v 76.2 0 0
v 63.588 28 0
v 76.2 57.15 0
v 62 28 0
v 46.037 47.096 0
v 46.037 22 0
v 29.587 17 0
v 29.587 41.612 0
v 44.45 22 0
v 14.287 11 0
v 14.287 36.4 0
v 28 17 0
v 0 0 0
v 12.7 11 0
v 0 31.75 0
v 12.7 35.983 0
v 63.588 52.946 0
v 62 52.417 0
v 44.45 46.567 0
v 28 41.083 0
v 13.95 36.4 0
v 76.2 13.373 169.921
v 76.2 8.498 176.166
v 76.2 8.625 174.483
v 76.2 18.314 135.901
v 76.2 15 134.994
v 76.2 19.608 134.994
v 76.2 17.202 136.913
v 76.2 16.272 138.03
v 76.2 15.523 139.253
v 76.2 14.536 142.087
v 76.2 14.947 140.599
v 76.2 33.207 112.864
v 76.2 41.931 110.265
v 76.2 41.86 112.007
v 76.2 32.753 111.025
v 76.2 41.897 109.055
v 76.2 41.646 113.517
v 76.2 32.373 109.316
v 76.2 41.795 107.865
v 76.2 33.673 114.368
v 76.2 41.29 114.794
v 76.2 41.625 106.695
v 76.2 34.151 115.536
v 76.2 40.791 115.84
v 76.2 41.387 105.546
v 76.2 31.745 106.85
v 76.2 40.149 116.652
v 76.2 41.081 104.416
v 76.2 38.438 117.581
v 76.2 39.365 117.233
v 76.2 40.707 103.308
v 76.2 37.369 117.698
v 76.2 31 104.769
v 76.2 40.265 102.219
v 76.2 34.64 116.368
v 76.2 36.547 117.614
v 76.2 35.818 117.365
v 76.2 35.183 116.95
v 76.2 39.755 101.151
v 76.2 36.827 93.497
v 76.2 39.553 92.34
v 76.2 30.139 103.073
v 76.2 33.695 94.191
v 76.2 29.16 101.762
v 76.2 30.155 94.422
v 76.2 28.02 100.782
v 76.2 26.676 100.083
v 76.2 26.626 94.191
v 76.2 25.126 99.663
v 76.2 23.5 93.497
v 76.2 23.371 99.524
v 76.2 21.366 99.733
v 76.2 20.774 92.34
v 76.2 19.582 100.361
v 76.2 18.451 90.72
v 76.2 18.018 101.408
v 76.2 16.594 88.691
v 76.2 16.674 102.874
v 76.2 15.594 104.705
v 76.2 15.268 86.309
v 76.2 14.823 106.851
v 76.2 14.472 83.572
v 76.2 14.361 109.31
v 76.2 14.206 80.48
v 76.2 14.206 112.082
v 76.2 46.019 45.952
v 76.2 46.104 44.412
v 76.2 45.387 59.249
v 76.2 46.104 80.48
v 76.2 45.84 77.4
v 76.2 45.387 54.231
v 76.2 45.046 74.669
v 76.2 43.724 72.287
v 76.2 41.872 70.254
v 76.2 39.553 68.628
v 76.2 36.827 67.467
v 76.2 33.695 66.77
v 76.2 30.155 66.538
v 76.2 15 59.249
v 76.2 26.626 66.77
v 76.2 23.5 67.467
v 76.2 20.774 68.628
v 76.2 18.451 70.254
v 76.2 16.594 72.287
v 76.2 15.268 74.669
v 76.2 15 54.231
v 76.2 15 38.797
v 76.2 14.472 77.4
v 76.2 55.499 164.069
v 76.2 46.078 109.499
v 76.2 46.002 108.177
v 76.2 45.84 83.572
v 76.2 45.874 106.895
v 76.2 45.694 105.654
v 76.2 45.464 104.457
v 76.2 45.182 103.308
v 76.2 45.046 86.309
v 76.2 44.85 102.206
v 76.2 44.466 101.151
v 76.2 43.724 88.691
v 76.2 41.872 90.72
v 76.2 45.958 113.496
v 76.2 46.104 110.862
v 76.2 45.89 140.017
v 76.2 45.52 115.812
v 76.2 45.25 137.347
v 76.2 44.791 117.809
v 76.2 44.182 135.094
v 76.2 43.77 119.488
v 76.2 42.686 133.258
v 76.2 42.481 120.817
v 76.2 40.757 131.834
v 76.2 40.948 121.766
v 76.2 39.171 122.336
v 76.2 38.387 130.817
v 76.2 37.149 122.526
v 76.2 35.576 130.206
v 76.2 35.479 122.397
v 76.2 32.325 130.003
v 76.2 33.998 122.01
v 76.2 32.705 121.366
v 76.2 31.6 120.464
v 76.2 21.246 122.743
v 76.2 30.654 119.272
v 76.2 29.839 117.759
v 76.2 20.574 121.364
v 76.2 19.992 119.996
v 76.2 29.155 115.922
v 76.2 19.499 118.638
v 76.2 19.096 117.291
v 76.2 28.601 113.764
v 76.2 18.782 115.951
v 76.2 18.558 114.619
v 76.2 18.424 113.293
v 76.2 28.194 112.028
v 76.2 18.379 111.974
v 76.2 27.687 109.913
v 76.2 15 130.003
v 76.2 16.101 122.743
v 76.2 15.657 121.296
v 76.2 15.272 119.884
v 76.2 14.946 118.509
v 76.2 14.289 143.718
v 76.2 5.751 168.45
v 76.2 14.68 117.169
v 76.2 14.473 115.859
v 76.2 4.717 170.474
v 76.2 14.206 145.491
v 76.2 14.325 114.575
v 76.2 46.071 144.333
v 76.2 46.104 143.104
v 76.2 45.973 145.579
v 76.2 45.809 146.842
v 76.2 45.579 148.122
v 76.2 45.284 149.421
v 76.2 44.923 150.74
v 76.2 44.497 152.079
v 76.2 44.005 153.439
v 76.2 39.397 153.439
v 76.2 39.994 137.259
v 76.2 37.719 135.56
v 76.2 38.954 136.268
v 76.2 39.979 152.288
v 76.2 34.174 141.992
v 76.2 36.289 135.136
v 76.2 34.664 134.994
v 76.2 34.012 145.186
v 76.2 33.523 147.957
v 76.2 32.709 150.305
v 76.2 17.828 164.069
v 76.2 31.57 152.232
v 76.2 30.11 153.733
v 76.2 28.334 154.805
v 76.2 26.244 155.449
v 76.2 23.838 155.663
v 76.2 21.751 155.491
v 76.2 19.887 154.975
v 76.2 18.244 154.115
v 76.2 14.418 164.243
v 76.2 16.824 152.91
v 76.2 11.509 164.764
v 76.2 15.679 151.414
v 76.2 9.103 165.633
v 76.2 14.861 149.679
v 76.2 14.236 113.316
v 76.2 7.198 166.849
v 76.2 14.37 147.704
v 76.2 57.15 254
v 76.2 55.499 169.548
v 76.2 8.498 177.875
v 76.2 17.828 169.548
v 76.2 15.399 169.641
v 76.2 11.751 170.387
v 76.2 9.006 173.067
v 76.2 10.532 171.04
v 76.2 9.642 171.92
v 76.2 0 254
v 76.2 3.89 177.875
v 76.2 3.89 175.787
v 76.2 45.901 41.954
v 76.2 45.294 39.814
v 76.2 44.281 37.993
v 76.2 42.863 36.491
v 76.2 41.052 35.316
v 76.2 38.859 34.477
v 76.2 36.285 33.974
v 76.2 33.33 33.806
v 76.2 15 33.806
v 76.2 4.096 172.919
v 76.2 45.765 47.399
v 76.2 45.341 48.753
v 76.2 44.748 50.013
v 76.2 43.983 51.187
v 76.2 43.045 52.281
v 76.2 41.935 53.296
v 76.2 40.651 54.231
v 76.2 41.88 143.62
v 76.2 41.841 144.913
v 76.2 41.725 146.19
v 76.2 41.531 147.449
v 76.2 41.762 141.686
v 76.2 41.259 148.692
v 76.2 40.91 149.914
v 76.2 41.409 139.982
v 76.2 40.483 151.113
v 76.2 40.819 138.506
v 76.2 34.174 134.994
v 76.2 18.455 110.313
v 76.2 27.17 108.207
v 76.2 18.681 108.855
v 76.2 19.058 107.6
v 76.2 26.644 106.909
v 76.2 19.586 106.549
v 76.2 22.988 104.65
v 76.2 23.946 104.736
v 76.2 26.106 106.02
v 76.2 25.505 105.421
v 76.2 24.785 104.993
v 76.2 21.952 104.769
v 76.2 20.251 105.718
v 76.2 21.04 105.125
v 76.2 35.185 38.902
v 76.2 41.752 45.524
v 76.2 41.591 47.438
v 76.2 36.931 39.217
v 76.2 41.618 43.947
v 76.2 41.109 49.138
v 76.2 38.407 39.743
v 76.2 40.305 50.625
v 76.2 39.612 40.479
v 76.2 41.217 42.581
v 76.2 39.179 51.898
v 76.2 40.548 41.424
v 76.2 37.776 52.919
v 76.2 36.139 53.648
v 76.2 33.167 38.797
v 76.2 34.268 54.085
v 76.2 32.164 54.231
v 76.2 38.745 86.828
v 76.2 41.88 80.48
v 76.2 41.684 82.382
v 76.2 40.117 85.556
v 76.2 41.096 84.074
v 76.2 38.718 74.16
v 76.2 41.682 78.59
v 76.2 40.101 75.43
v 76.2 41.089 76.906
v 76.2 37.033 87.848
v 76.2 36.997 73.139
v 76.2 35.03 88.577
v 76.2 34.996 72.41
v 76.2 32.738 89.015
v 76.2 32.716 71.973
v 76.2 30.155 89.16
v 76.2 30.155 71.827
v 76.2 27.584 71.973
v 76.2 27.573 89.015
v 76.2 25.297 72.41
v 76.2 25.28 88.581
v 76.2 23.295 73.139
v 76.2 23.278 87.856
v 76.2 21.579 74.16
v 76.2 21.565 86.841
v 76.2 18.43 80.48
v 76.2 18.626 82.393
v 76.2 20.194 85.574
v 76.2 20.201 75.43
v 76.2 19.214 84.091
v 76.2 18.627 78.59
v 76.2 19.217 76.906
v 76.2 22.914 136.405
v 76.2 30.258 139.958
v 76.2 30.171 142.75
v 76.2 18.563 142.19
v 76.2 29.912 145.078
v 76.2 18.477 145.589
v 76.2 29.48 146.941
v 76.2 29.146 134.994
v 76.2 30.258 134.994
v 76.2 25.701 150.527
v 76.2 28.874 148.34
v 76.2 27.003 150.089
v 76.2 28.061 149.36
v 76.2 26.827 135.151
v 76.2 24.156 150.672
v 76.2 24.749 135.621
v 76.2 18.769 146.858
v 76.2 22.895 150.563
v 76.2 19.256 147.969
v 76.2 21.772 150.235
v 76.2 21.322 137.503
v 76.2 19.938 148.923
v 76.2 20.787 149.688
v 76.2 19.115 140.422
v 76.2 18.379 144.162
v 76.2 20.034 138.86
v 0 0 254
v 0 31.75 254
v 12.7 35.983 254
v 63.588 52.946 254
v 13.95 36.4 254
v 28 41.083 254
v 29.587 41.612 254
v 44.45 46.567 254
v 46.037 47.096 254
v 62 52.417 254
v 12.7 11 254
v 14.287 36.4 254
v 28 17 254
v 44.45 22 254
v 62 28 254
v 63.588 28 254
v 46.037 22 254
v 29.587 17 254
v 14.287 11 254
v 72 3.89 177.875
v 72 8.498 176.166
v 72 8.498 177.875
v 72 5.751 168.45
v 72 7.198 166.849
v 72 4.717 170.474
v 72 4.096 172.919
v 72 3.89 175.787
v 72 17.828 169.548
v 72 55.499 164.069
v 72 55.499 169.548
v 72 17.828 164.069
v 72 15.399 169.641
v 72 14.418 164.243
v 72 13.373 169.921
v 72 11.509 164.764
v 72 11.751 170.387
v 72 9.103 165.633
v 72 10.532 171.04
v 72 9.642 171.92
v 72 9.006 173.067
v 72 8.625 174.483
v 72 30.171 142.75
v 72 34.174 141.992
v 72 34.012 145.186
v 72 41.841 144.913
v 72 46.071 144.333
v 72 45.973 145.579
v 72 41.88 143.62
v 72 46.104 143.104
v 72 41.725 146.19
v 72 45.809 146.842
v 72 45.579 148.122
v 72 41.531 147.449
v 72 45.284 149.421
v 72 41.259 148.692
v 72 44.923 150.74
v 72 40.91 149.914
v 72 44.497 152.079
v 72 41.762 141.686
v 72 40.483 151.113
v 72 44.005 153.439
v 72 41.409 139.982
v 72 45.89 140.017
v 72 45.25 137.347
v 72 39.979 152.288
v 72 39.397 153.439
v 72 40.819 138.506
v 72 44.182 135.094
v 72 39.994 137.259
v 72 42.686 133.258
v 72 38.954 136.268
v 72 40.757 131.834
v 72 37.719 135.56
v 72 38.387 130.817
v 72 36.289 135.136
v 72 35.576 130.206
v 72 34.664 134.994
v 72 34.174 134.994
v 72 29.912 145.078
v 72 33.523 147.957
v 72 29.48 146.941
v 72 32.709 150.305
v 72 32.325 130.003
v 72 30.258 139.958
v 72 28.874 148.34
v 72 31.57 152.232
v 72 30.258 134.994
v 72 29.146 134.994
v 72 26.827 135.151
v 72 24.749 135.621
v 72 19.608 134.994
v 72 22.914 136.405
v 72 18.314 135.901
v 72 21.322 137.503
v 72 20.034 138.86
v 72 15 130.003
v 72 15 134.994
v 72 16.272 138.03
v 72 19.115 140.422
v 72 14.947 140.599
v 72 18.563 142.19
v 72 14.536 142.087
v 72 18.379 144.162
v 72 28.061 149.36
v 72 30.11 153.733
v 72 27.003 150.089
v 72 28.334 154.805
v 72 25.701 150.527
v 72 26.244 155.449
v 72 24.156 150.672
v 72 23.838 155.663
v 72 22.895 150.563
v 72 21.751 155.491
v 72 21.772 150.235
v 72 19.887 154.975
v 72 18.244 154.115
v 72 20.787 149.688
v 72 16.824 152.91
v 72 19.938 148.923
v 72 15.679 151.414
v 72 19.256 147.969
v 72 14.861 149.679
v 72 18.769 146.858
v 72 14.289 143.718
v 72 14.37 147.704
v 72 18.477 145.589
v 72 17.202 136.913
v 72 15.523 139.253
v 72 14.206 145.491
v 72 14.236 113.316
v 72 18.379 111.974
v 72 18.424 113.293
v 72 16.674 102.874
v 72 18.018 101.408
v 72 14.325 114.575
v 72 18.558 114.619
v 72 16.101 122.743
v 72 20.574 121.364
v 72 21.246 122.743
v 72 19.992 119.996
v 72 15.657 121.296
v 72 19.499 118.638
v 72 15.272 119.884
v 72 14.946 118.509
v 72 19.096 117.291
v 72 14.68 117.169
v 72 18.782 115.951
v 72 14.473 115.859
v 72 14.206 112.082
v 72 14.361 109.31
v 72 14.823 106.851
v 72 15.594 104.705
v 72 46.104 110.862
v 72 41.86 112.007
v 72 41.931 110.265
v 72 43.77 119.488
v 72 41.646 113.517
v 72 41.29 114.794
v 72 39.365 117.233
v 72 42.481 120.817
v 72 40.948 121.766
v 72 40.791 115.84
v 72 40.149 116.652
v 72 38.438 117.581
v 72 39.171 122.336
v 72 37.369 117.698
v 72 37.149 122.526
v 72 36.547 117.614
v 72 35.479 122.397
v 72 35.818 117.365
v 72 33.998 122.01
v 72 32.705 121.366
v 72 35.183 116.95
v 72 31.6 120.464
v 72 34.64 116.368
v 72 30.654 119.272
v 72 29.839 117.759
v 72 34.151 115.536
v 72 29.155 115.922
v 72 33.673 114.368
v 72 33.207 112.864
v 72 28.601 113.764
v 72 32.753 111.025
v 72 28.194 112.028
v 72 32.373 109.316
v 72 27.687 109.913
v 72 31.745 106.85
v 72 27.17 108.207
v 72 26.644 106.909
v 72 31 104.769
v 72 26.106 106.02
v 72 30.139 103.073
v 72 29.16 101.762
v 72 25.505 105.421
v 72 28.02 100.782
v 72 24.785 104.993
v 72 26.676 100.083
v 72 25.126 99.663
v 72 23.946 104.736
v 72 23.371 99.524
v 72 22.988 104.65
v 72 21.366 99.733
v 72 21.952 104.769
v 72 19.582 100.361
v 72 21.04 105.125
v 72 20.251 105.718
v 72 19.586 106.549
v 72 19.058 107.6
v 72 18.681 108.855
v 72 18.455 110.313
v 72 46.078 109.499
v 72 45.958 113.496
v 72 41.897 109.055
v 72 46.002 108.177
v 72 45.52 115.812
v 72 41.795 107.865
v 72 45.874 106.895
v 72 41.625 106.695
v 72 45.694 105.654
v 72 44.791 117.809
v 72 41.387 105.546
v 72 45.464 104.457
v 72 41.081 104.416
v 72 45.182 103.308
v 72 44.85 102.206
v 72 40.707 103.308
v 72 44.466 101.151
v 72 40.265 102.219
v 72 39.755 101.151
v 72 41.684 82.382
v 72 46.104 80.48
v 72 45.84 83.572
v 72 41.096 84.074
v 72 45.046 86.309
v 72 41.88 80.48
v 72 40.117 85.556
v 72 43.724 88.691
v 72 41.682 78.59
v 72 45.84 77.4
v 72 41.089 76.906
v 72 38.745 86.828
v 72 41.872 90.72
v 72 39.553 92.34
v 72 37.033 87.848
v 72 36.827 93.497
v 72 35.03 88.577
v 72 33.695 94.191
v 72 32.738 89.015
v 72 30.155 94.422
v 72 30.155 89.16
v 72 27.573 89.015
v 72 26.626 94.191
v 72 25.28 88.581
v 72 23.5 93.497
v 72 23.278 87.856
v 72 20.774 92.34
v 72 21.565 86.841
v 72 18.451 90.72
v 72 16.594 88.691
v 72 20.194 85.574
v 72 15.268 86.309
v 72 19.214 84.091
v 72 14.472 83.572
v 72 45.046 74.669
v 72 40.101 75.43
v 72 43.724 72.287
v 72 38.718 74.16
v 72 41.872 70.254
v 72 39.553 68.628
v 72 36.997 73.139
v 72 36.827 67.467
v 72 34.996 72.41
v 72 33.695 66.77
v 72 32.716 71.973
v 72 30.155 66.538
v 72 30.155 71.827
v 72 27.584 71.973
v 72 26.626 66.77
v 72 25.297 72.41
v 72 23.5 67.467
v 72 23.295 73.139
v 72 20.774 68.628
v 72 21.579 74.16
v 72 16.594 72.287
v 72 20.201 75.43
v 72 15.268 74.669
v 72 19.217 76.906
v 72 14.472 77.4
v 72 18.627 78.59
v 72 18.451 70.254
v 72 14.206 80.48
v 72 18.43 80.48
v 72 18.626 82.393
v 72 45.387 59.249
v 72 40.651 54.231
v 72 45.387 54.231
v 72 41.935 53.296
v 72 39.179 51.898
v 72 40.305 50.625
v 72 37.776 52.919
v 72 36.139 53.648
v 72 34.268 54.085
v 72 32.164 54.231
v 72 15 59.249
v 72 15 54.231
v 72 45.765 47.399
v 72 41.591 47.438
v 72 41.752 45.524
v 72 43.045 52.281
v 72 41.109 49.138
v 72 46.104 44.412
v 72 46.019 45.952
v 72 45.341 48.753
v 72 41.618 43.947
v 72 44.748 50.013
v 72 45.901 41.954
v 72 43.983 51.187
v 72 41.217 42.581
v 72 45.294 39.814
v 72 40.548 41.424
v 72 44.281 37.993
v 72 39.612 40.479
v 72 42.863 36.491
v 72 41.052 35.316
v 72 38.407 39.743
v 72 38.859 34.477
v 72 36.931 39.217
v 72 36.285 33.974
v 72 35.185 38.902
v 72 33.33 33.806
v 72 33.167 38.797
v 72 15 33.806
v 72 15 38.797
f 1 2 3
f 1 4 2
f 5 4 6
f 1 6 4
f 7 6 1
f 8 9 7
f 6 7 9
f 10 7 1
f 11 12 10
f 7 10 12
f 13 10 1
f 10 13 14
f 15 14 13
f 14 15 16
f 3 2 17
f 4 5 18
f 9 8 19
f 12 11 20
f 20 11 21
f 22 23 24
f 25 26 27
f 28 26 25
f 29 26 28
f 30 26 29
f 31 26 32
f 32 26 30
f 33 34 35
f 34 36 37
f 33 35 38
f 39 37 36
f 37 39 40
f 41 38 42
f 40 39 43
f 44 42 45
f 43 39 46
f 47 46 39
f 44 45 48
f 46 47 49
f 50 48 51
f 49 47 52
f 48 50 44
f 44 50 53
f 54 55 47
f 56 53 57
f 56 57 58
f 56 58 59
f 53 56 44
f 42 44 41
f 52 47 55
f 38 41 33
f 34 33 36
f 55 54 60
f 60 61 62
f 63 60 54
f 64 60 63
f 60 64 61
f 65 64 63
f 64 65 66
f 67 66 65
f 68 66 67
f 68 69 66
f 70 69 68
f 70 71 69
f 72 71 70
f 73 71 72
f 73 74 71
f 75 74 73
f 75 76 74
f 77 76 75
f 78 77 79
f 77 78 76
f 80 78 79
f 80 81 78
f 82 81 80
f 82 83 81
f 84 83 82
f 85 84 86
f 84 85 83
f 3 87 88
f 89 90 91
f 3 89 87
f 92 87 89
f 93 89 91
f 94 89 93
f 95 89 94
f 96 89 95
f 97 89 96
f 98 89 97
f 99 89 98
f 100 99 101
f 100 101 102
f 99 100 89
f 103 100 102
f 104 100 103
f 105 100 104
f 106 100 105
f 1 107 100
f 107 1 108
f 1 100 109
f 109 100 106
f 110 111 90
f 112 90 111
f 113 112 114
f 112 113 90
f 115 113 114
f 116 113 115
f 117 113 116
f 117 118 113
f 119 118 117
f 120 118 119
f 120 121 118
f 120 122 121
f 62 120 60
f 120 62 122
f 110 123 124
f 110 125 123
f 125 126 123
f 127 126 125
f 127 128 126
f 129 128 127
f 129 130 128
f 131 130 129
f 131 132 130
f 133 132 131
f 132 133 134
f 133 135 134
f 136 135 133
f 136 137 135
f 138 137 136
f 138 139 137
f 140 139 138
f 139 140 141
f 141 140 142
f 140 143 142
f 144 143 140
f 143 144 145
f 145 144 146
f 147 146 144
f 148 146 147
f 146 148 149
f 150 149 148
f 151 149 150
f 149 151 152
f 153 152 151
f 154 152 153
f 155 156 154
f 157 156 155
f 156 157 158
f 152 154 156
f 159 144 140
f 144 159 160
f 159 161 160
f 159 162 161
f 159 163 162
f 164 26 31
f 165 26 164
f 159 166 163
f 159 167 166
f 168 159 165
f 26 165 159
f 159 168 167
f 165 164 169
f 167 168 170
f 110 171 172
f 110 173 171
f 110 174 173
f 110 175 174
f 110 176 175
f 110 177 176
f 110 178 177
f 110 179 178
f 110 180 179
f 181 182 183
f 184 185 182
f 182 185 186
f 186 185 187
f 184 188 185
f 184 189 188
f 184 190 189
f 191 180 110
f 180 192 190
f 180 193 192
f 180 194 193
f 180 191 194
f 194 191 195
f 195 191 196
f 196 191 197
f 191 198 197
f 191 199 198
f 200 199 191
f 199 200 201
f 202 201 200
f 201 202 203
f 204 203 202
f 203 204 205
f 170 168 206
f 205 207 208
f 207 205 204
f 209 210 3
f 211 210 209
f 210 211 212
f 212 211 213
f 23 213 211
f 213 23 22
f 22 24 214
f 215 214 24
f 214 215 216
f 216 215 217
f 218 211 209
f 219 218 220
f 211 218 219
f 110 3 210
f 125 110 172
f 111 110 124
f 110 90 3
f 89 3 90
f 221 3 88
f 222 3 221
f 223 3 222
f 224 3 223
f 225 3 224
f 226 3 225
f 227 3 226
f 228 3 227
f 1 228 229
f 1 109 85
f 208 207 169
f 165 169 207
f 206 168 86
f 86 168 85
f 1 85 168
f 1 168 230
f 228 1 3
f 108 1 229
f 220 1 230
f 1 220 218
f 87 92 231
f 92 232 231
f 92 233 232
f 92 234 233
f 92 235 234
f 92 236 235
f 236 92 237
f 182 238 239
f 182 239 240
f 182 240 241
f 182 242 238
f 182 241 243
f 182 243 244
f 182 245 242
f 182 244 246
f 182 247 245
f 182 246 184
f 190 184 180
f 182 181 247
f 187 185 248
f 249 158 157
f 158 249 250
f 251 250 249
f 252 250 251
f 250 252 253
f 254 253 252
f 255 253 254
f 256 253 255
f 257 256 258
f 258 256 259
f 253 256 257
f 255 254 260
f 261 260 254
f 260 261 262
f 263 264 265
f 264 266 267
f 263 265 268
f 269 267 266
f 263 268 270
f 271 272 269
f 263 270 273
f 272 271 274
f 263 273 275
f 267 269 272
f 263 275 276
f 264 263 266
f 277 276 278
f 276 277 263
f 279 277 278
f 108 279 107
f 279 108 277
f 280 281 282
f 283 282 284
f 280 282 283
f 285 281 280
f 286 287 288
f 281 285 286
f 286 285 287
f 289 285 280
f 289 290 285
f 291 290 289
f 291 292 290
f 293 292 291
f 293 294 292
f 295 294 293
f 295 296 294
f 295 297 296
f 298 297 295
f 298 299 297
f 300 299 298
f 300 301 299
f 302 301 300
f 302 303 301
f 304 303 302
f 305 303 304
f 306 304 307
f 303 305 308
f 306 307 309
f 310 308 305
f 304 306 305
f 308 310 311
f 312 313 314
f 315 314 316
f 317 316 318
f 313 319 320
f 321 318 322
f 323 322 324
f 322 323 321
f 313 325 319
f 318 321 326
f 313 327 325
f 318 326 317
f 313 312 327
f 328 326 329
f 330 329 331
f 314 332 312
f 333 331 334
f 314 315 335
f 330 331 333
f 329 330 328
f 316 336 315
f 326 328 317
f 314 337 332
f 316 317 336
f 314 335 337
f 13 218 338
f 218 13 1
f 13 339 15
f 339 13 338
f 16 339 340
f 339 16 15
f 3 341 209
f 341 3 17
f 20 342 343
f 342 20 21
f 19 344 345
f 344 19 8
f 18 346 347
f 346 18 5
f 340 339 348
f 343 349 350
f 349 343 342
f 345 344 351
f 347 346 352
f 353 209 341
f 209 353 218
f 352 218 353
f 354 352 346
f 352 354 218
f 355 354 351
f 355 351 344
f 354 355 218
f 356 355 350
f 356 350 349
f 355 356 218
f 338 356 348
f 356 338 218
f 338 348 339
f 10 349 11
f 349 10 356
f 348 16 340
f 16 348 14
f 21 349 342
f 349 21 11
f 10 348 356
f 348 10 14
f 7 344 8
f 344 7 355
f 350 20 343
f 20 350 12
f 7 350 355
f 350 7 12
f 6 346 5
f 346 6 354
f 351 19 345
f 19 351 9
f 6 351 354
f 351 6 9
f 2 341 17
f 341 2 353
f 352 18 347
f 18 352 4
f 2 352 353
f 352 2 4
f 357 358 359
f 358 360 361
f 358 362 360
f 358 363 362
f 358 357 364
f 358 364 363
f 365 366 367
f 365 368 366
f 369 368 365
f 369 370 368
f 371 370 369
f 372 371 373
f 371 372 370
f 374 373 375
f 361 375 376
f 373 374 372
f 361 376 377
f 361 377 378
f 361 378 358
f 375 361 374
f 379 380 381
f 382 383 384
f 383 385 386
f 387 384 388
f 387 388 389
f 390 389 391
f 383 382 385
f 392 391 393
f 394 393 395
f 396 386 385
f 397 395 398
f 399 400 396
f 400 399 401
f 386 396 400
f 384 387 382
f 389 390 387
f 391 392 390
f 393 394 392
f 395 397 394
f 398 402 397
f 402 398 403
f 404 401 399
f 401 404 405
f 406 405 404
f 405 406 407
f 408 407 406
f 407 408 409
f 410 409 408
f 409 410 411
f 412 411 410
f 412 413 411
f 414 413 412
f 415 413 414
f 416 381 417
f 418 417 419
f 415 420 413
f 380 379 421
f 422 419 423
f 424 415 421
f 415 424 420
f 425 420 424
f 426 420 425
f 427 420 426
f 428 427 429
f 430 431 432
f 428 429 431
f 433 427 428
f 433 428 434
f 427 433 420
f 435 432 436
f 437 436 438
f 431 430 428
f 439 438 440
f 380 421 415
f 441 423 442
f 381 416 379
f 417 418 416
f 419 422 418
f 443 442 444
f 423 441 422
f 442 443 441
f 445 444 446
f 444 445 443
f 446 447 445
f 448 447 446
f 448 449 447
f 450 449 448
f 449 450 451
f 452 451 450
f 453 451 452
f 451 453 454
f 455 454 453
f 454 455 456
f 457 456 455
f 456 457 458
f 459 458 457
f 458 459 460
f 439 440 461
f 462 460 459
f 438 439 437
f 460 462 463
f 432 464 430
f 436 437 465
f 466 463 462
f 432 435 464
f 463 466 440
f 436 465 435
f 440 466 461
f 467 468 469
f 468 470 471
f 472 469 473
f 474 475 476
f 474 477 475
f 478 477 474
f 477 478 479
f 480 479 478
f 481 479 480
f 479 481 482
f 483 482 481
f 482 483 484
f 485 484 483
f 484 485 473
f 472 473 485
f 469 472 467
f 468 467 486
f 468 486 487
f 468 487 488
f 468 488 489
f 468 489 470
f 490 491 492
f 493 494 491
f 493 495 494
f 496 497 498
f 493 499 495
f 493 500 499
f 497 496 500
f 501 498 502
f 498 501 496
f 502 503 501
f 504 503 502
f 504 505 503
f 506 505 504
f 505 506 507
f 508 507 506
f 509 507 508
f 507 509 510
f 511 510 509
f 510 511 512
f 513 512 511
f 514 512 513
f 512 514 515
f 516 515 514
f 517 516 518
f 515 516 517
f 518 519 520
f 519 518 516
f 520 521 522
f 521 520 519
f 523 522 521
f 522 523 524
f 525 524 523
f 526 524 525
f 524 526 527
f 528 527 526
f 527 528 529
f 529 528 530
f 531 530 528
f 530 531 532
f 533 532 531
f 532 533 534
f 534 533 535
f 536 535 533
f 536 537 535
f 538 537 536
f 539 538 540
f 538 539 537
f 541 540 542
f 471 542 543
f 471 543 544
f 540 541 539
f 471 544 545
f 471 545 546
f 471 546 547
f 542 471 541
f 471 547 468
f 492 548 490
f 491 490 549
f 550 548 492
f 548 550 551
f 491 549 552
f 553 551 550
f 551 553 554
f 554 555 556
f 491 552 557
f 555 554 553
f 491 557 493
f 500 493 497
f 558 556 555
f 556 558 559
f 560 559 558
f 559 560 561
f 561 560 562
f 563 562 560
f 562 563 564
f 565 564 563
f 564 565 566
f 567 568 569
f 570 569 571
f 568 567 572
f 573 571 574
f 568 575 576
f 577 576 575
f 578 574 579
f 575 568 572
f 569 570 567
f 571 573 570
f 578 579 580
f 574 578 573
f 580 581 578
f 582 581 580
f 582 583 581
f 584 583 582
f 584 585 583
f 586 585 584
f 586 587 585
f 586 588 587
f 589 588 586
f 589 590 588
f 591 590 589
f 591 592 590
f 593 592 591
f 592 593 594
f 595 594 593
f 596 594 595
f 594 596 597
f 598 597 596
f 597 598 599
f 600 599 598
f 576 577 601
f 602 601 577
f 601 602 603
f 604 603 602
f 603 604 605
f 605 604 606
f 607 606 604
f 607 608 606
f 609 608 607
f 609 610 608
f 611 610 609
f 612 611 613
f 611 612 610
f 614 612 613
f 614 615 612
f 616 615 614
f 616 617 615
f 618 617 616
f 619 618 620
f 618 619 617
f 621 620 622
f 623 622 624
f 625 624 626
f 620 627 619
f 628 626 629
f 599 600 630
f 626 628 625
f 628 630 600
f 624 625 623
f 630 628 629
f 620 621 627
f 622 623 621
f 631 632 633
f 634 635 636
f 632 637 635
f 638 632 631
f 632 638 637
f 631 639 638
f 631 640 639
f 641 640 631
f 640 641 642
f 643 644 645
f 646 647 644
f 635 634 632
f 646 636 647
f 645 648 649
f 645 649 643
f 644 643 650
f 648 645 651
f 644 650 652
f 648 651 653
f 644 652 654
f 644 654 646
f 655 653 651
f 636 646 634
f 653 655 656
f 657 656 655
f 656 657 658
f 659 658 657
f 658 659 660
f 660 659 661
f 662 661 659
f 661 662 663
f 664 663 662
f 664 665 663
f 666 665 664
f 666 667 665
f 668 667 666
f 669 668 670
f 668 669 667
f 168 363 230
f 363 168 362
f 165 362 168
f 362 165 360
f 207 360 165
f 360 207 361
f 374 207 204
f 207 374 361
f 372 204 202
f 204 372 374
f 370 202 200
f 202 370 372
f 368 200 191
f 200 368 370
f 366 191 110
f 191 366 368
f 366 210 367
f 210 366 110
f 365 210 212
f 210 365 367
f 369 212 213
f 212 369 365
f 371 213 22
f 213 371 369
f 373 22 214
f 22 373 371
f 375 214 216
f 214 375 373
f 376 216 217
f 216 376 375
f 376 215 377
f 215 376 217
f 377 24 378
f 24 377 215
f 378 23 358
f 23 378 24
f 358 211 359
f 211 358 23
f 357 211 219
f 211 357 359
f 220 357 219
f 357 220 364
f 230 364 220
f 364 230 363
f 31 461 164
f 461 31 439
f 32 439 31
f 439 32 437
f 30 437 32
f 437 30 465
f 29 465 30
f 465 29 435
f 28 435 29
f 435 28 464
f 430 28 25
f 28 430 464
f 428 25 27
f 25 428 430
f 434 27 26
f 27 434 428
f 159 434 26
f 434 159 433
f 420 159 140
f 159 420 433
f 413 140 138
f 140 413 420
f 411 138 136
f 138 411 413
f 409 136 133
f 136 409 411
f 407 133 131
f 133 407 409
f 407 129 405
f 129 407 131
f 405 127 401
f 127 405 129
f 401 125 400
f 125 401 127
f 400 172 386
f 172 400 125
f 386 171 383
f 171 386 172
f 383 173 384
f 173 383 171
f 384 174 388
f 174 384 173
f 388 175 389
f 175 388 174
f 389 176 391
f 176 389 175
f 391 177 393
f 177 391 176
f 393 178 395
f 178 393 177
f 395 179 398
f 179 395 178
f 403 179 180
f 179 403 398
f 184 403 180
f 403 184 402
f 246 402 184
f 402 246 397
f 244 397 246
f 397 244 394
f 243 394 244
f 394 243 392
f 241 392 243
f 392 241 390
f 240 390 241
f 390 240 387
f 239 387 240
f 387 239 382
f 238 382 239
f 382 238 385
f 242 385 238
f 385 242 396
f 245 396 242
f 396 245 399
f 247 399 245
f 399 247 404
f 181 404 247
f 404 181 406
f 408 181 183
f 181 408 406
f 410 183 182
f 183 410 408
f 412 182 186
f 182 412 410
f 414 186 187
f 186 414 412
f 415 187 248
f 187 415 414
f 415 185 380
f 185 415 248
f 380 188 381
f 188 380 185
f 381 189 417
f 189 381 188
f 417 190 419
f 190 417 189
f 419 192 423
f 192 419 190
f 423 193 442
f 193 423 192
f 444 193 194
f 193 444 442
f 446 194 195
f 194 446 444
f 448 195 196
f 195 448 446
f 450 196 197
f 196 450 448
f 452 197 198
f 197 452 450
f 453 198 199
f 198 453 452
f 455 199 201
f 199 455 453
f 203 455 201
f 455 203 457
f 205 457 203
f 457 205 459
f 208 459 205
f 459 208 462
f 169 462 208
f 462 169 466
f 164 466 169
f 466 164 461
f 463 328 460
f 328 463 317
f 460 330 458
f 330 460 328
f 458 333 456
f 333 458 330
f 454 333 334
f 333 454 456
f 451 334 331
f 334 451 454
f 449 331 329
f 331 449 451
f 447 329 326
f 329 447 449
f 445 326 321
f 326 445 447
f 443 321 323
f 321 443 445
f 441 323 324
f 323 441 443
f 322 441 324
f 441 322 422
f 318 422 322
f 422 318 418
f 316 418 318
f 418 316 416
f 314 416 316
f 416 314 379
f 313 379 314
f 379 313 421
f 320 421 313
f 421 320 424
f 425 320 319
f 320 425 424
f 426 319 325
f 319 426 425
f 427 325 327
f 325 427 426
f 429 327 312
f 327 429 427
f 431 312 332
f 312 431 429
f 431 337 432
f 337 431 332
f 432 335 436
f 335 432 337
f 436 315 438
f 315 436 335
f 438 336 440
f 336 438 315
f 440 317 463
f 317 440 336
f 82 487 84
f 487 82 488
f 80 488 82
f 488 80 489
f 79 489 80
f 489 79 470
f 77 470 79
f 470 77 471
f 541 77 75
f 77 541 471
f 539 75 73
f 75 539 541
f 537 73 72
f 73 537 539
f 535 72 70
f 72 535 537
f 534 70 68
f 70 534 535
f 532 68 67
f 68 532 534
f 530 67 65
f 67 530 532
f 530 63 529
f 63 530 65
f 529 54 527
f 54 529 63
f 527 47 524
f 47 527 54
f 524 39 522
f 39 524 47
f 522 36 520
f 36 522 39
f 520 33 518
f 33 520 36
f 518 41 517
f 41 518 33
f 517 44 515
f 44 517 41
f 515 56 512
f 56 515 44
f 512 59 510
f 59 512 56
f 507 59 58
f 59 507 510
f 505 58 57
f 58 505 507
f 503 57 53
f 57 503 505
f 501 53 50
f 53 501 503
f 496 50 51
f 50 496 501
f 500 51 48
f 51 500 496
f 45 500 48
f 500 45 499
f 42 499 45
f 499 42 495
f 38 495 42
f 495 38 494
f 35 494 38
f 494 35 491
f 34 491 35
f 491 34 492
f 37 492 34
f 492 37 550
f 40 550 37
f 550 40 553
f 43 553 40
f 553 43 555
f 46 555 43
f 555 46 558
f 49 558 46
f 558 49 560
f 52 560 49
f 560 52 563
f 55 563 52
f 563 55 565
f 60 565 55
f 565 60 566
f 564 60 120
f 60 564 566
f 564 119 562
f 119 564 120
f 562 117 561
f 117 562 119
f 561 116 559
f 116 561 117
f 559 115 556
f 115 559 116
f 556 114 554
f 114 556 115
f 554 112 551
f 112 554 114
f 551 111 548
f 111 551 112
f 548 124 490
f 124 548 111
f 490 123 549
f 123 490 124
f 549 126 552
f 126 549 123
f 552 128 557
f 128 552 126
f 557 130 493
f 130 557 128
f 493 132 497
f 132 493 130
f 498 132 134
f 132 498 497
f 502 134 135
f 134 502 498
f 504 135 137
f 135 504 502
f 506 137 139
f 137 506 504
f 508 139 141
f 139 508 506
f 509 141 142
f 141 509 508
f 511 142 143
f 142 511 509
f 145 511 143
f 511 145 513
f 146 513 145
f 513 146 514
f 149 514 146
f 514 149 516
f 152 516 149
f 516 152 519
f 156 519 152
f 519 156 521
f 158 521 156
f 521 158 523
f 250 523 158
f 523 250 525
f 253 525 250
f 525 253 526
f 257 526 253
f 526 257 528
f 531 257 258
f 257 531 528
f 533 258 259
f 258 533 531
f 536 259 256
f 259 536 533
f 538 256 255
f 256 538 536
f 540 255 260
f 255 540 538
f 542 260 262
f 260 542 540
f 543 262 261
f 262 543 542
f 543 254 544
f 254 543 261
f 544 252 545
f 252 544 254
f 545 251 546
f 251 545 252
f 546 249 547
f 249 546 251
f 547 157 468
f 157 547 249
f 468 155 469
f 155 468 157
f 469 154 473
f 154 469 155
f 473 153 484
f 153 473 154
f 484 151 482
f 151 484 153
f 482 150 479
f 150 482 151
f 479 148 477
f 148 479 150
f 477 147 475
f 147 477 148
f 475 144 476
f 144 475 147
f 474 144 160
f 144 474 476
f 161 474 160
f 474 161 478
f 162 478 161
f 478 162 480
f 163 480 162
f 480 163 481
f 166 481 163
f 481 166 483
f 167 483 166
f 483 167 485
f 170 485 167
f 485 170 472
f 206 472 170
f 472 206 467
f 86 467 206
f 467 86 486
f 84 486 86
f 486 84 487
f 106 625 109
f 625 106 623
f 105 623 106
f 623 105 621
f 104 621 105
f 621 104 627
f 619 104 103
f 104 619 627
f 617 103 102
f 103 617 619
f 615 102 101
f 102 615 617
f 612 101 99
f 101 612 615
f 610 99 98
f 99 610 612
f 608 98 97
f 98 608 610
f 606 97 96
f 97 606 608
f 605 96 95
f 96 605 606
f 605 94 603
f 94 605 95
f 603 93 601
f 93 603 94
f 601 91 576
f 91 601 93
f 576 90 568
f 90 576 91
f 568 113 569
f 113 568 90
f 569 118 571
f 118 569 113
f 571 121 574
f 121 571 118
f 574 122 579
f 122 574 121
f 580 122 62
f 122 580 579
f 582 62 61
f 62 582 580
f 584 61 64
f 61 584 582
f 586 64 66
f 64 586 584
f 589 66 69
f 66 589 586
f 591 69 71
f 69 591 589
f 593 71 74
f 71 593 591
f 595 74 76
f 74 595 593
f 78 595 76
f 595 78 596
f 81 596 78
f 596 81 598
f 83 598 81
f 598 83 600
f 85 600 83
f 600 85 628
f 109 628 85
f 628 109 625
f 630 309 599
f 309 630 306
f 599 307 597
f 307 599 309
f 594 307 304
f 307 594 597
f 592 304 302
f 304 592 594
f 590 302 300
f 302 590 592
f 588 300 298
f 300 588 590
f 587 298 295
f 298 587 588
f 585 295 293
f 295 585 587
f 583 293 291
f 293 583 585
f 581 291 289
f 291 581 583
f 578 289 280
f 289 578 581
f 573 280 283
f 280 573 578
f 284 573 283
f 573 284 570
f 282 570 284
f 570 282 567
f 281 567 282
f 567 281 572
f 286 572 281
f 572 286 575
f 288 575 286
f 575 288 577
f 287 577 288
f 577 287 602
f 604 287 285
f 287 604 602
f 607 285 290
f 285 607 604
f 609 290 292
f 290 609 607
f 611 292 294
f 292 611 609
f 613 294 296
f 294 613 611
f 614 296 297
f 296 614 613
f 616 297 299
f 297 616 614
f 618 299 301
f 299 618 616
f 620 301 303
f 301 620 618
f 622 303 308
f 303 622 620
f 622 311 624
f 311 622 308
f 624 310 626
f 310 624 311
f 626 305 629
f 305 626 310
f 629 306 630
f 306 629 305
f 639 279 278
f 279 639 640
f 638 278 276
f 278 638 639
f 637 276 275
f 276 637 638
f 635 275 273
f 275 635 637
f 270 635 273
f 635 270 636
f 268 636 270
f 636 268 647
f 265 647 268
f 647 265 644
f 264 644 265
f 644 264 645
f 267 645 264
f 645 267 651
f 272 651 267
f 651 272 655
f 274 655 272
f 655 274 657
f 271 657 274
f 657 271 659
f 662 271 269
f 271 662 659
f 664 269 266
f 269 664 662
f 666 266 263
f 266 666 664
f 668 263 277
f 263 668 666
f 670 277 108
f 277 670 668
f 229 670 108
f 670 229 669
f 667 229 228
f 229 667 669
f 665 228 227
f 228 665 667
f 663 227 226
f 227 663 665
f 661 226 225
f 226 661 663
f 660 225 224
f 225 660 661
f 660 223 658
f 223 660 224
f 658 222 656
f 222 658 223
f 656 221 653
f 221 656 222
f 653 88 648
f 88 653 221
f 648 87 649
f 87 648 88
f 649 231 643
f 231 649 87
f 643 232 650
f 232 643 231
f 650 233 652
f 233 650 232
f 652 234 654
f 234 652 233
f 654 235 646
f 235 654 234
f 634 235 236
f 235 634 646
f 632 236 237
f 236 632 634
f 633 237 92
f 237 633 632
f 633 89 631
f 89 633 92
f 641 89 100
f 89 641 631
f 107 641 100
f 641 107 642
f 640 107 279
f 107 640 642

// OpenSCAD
difference(){
    linear_extrude(254){
        polygon(points=[[0,0],[0,31.75],[76.2,57.15],[76.2,0]]);
    }
    
    translate([12.7,11,0]){
        cube([1.5875,25.4,254]);
    }
    translate([28,17,0]){
        cube([1.5875,25.4,254]);
    }
    translate([44.45,22,0]){
        cube([1.5875,25.4,254]);
    }
    translate([62,28,0]){
        cube([1.5875,25.4,254]);
    }
    
    translate([72,15,175]){
        rotate([0,90,0]){
            linear_extrude(5){
                #text("Jason", size=40, font="Z003:style=Medium Italic");
            }
        }
    }
}
